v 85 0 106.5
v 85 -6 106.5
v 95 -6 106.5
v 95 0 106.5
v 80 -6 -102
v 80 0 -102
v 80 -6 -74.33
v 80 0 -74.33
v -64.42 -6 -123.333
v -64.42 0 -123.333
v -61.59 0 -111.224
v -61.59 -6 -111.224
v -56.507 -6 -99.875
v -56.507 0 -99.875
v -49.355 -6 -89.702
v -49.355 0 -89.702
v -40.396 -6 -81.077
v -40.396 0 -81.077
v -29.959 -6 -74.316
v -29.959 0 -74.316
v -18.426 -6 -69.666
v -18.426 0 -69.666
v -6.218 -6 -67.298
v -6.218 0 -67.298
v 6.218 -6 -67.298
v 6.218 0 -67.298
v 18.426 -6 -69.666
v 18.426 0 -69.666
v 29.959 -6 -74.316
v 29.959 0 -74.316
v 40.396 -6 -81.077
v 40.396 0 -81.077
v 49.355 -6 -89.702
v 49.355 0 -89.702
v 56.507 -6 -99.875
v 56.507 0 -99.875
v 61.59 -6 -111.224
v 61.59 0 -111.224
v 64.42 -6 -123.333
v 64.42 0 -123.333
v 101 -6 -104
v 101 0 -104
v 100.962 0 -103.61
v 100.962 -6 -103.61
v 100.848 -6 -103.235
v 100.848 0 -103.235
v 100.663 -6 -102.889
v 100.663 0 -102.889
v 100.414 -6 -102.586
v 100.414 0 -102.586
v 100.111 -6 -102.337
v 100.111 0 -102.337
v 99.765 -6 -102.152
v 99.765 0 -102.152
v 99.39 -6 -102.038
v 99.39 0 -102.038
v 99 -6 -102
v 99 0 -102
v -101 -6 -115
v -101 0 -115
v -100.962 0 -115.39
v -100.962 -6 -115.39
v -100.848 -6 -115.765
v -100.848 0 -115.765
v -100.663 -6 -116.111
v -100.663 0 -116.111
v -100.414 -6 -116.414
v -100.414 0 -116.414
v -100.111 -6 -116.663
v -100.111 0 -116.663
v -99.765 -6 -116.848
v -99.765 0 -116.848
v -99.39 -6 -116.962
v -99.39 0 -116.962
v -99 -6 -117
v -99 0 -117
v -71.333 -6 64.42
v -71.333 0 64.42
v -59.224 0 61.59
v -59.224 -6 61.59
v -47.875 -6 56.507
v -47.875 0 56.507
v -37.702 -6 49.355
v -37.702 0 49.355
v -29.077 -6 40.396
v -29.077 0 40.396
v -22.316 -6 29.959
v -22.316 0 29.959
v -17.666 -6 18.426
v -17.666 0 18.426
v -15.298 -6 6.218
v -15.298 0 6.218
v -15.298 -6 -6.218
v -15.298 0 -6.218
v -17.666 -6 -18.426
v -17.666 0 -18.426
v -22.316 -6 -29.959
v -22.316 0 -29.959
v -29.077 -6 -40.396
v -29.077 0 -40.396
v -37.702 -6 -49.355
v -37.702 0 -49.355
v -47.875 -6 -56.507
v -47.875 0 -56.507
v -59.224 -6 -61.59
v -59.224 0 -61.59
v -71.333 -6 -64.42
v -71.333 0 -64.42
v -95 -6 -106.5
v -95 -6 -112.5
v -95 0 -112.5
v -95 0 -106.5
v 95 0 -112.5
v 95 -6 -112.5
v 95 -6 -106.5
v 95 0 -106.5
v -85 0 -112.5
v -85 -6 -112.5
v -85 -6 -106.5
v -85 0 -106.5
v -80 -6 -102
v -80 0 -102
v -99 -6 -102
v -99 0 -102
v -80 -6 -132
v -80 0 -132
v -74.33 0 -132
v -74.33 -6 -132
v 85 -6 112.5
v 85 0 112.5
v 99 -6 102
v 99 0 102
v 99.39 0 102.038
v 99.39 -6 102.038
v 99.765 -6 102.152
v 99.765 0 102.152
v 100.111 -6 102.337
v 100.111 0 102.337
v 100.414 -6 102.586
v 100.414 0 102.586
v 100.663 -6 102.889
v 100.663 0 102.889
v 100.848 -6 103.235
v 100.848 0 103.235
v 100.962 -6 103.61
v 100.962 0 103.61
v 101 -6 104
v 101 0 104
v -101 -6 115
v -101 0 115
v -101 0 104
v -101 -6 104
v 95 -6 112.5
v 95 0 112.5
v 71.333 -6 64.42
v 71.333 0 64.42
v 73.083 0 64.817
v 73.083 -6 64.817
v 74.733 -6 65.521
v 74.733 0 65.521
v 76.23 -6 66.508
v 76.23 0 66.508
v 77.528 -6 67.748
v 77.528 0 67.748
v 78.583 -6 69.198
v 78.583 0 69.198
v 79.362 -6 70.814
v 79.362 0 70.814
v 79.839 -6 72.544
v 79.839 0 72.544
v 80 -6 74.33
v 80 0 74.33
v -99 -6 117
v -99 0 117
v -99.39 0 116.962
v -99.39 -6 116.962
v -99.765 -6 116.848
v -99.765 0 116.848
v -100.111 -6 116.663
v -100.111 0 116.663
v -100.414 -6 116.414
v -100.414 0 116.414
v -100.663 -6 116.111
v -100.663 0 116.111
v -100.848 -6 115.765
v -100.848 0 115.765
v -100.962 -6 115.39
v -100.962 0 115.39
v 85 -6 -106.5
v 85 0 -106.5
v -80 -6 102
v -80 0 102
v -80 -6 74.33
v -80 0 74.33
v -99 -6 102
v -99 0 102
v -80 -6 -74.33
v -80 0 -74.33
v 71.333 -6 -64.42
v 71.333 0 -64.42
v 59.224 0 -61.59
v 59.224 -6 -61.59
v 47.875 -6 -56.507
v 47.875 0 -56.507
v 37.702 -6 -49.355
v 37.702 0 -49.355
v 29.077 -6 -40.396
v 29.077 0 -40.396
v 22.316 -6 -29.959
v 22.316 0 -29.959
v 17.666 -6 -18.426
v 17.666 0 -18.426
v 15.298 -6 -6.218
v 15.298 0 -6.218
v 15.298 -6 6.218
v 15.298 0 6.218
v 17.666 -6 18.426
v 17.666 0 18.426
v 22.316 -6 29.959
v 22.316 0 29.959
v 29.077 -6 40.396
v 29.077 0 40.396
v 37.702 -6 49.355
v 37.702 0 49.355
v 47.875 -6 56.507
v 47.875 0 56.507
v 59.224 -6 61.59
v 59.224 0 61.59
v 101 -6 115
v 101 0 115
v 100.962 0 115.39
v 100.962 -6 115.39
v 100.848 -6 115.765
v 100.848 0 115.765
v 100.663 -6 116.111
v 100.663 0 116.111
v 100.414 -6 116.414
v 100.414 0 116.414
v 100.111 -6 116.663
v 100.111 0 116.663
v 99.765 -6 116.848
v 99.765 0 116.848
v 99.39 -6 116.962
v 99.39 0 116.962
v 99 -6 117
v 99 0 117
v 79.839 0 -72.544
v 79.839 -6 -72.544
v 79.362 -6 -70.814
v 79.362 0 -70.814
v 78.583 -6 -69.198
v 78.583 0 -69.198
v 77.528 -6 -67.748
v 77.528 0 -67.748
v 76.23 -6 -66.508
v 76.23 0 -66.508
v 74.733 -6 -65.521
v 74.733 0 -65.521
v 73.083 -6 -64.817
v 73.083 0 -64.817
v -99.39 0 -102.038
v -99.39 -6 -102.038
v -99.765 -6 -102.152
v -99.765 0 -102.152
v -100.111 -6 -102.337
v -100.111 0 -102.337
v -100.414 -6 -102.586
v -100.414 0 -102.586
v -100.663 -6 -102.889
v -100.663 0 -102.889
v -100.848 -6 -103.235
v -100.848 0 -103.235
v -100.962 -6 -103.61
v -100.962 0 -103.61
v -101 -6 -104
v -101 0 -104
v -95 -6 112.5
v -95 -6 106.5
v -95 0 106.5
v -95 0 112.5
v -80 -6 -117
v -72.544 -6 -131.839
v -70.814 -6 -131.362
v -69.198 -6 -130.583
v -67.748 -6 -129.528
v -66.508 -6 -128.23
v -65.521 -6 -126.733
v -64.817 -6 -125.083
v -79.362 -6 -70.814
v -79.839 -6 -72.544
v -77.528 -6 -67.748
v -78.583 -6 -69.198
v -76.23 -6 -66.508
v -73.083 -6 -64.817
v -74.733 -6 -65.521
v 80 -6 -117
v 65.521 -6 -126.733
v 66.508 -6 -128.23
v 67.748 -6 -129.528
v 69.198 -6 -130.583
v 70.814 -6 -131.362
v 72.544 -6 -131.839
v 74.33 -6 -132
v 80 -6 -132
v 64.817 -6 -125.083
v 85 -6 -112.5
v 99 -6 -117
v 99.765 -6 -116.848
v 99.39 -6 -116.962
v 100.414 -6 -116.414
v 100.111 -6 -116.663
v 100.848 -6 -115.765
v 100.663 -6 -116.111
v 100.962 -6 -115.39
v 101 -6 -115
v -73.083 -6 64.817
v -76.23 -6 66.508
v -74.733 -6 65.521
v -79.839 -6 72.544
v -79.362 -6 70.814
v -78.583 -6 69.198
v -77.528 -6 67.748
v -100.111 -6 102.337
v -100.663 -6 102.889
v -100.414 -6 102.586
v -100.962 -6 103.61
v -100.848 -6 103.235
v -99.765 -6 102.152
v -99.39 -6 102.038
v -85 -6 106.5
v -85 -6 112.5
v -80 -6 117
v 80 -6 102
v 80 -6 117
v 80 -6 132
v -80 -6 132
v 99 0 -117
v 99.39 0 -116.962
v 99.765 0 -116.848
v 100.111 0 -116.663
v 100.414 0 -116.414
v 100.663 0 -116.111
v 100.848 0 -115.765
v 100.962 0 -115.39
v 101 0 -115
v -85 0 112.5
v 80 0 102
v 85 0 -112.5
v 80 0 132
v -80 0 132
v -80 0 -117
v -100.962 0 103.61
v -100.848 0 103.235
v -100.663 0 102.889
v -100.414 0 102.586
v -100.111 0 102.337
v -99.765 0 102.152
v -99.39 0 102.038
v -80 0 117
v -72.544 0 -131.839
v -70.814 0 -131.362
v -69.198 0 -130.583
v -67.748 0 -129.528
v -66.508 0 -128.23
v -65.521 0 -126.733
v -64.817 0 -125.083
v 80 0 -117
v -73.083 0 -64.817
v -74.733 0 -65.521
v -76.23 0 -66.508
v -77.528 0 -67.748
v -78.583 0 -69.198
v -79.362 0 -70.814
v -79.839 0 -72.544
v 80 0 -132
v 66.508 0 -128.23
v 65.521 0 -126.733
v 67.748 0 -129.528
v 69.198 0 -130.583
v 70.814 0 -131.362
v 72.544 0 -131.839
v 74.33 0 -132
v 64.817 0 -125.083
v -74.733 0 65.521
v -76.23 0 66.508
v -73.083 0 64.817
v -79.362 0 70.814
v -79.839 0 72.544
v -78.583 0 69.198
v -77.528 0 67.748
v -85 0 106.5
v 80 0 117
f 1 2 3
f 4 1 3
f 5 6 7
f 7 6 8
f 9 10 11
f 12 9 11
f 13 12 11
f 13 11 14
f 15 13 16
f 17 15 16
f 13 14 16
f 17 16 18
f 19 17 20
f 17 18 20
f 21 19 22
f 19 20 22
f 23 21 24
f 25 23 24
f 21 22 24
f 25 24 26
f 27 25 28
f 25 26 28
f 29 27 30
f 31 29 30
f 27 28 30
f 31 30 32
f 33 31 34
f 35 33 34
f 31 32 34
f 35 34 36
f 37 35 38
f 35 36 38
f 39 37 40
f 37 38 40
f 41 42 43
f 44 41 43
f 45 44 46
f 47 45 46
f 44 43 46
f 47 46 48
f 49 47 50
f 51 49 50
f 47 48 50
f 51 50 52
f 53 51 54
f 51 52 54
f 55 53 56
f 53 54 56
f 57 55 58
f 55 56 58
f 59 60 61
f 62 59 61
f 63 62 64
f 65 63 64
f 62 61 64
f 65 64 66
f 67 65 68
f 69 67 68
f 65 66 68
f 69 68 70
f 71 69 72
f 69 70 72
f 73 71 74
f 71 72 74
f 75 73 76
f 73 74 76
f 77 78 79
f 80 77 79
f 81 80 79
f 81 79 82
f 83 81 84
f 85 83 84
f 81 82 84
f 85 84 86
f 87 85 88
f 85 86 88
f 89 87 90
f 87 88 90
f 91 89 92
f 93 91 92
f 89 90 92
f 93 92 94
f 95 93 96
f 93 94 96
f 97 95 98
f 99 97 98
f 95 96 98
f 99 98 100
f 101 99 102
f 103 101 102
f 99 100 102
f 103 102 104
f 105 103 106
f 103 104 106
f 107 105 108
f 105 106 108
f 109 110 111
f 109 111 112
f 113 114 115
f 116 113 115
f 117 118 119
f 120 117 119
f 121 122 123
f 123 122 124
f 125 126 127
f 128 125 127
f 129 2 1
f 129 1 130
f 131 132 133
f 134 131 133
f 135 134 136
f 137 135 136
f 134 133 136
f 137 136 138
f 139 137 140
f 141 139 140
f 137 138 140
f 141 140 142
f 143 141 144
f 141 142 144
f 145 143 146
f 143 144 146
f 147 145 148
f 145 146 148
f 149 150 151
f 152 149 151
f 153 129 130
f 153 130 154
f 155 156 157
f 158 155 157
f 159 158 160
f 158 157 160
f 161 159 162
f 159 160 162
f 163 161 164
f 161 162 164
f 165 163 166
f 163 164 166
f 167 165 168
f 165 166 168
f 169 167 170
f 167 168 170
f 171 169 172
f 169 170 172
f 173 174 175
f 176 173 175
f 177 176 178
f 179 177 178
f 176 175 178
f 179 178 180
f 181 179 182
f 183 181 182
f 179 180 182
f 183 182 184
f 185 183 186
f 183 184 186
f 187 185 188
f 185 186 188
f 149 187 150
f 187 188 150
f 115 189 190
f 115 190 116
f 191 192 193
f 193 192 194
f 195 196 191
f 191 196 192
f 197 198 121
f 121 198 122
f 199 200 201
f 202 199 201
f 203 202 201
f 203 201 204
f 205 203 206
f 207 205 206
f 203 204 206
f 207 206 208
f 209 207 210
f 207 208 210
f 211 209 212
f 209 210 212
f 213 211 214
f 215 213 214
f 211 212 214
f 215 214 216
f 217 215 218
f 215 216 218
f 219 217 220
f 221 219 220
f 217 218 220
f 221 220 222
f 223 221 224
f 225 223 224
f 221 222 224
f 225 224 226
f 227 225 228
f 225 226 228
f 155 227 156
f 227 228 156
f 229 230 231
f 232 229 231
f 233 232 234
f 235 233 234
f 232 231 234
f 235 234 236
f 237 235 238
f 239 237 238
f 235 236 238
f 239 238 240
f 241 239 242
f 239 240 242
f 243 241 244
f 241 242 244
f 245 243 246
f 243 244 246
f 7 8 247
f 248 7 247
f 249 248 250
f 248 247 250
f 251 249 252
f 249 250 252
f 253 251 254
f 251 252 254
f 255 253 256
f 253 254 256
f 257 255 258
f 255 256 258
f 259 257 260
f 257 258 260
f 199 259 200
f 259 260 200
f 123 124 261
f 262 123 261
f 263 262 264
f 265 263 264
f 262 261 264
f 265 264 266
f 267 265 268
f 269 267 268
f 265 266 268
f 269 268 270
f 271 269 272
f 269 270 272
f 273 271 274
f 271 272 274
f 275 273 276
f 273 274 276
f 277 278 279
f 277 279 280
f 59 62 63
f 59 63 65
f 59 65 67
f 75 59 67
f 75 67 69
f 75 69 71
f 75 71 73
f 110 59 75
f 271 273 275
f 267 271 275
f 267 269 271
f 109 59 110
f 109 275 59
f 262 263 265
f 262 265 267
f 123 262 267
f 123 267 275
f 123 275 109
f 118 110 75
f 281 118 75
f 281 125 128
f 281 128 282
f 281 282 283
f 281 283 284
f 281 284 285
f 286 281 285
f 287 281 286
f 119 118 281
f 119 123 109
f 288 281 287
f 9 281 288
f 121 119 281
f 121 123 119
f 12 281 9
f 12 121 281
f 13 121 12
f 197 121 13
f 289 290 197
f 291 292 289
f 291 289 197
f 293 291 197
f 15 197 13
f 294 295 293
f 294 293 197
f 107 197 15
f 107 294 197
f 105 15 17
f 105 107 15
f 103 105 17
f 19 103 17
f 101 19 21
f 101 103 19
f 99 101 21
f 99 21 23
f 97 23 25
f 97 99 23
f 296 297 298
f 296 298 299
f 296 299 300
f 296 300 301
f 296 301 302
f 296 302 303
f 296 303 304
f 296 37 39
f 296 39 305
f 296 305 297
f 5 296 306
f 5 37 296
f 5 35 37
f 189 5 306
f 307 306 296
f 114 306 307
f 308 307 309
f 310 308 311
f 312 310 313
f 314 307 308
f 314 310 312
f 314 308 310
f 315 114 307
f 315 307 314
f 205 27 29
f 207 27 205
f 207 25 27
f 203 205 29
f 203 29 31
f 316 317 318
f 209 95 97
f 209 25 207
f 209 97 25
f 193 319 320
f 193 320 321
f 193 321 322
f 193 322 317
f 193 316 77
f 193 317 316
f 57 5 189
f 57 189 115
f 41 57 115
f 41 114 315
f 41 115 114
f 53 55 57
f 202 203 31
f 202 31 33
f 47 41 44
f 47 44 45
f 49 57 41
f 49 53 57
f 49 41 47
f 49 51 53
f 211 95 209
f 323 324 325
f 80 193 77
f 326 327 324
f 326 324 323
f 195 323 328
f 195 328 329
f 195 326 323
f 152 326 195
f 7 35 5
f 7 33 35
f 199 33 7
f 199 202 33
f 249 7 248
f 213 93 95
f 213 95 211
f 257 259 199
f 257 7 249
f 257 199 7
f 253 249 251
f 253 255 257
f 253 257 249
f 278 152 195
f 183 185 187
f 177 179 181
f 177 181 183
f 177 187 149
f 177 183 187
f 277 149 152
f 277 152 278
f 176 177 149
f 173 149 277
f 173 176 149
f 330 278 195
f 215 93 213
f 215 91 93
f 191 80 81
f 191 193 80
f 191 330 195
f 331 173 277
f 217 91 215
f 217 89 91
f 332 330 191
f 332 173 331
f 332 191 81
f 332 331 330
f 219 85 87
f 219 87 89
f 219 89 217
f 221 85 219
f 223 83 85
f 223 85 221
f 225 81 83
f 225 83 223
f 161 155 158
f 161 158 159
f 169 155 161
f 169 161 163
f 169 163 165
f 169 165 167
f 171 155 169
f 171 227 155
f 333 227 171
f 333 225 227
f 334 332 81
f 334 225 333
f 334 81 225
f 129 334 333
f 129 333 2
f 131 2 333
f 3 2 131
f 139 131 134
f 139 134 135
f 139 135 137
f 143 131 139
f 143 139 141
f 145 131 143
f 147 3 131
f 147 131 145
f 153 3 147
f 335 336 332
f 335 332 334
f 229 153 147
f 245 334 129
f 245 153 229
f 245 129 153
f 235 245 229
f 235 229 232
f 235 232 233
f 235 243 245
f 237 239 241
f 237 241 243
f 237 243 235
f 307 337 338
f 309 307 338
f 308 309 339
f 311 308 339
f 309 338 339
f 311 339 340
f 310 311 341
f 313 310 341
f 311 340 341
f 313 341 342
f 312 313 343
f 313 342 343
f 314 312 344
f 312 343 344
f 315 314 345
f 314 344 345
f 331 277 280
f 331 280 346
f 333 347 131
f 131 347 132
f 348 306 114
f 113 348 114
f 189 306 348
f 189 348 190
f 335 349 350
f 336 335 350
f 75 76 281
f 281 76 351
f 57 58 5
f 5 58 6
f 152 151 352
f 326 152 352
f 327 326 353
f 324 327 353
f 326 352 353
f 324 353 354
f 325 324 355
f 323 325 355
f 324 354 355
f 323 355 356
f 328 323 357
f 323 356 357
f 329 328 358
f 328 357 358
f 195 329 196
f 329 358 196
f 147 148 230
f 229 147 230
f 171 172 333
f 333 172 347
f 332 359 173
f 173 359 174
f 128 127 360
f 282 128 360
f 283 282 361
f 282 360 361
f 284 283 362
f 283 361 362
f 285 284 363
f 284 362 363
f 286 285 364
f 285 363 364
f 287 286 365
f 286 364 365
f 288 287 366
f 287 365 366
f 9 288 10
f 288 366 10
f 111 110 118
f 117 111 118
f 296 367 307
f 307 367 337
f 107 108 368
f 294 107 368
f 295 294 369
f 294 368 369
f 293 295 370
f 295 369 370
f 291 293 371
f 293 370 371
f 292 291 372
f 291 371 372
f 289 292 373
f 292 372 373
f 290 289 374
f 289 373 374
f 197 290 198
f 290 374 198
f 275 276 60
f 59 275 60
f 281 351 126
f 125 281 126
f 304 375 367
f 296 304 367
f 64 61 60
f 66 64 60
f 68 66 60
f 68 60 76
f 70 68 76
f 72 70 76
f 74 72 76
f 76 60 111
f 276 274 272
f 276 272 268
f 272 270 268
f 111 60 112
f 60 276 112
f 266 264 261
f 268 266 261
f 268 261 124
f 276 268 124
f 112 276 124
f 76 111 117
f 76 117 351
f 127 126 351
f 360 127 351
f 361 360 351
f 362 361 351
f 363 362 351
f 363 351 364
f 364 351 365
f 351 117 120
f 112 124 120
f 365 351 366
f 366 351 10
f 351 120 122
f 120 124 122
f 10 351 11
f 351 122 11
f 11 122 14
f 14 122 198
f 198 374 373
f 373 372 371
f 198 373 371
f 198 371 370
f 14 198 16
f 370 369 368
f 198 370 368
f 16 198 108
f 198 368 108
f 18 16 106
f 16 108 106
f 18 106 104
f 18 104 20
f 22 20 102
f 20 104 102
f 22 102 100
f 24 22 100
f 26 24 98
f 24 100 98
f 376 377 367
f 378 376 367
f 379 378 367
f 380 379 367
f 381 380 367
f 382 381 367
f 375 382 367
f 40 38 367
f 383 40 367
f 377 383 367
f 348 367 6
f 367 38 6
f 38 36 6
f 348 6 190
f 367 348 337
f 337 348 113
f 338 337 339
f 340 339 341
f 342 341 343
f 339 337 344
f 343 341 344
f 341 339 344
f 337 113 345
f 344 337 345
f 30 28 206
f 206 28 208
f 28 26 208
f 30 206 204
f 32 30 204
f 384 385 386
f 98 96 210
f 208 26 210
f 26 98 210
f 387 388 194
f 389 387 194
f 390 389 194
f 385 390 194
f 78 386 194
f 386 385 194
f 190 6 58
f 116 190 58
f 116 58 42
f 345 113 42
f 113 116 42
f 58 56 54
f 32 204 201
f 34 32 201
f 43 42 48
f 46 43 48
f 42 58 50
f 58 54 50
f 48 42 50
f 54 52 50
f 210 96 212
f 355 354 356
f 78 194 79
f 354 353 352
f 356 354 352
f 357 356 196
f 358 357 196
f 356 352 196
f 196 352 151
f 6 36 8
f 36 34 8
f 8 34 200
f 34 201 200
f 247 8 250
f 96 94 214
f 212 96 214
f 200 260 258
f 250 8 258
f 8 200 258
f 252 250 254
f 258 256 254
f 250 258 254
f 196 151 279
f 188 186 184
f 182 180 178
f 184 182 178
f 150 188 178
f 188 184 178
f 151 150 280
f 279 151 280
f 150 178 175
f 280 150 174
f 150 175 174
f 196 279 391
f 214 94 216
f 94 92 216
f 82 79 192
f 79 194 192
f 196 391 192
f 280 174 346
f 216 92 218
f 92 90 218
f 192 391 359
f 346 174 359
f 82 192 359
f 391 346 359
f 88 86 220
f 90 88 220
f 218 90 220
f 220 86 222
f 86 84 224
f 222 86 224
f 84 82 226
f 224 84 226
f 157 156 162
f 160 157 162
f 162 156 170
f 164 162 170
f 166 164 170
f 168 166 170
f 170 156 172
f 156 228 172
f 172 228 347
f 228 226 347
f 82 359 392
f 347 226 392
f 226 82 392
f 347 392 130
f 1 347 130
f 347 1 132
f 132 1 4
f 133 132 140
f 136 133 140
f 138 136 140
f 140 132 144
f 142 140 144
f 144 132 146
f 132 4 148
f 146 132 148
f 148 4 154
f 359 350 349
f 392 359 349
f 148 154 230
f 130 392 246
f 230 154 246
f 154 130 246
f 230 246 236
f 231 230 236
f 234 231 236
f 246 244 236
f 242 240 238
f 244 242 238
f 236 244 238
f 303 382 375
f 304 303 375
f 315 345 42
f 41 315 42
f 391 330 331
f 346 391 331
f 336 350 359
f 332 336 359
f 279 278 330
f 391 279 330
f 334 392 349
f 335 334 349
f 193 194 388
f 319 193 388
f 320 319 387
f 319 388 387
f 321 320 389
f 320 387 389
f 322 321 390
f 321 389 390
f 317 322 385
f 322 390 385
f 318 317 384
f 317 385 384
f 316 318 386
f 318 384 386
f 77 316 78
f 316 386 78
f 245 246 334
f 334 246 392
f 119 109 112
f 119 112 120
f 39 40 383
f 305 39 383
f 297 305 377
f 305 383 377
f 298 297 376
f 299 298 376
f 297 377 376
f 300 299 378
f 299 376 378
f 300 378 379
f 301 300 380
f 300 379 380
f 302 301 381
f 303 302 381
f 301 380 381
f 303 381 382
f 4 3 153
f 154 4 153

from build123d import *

# Parameters (mm, degrees)
F1_DEPTH = 6
F2_W     = 10
F2_H     = 6
F3_DEPTH = 25


with BuildPart() as f1:
    # F0 (on Front) → F1 (new body)
    with BuildSketch(Plane.XZ):
        with BuildLine():
            Line((80, 132), (-80, 132))
            Line((-80, 132), (-80, 117))
            Line((-80, 117), (-80, 102))
            Line((-80, 102), (-80, 74.330344))
            ThreePointArc((-80, 74.330344), (-77.527727, 67.747538), (-71.333333, 64.419631))
            ThreePointArc((-71.333333, 64.419631), (-15, 0), (-71.333333, -64.419631))
            ThreePointArc((-71.333333, -64.419631), (-77.527727, -67.747538), (-80, -74.330344))
            Line((-80, -74.330344), (-80, -102))
            Line((-80, -102), (-80, -117))
            Line((-80, -117), (-80, -132))
            Line((-80, -132), (-74.330344, -132))
            ThreePointArc((-74.330344, -132), (-67.747538, -129.527727), (-64.419631, -123.333333))
            ThreePointArc((-64.419631, -123.333333), (0, -67), (64.419631, -123.333333))
            ThreePointArc((64.419631, -123.333333), (67.747538, -129.527727), (74.330344, -132))
            Line((74.330344, -132), (80, -132))
            Line((80, -132), (80, -117))
            Line((80, -117), (80, -102))
            Line((80, -102), (80, -74.330344))
            ThreePointArc((80, -74.330344), (77.527727, -67.747538), (71.333333, -64.419631))
            ThreePointArc((71.333333, -64.419631), (15, 0), (71.333333, 64.419631))
            ThreePointArc((71.333333, 64.419631), (77.527727, 67.747538), (80, 74.330344))
            Line((80, 74.330344), (80, 102))
            Line((80, 102), (80, 117))
            Line((80, 117), (80, 132))
        make_face()
        with BuildLine():
            Line((-80, 102), (-80, 117))
            Line((-80, 117), (-99, 117))
            ThreePointArc((-99, 117), (-100.414214, 116.414214), (-101, 115))
            Line((-101, 115), (-101, 104))
            ThreePointArc((-101, 104), (-100.414214, 102.585786), (-99, 102))
            Line((-99, 102), (-80, 102))
        make_face()
        with BuildLine():
            Line((99, 117), (80, 117))
            Line((80, 117), (80, 102))
            Line((80, 102), (99, 102))
            ThreePointArc((99, 102), (100.414214, 102.585786), (101, 104))
            Line((101, 104), (101, 115))
            ThreePointArc((101, 115), (100.414214, 116.414214), (99, 117))
        make_face()
        with BuildLine():
            Line((-80, -117), (-80, -102))
            Line((-80, -102), (-99, -102))
            ThreePointArc((-99, -102), (-100.414214, -102.585786), (-101, -104))
            Line((-101, -104), (-101, -115))
            ThreePointArc((-101, -115), (-100.414214, -116.414214), (-99, -117))
            Line((-99, -117), (-80, -117))
        make_face()
        with BuildLine():
            Line((99, -102), (80, -102))
            Line((80, -102), (80, -117))
            Line((80, -117), (99, -117))
            ThreePointArc((99, -117), (100.414214, -116.414214), (101, -115))
            Line((101, -115), (101, -104))
            ThreePointArc((101, -104), (100.414214, -102.585786), (99, -102))
        make_face()
    extrude(amount=F1_DEPTH)

    # F2 (on face) → F3 (cut)
    with BuildSketch(Plane.XZ.offset(6)):
        with Locations((-90, 109.5)):
            Rectangle(F2_W, F2_H)
        with Locations((90, 109.5)):
            Rectangle(F2_W, F2_H)
        with Locations((-90, -109.5)):
            Rectangle(F2_W, F2_H)
        with Locations((90, -109.5)):
            Rectangle(F2_W, F2_H)
    extrude(amount=-F3_DEPTH, mode=Mode.SUBTRACT)


solid = f1.part
